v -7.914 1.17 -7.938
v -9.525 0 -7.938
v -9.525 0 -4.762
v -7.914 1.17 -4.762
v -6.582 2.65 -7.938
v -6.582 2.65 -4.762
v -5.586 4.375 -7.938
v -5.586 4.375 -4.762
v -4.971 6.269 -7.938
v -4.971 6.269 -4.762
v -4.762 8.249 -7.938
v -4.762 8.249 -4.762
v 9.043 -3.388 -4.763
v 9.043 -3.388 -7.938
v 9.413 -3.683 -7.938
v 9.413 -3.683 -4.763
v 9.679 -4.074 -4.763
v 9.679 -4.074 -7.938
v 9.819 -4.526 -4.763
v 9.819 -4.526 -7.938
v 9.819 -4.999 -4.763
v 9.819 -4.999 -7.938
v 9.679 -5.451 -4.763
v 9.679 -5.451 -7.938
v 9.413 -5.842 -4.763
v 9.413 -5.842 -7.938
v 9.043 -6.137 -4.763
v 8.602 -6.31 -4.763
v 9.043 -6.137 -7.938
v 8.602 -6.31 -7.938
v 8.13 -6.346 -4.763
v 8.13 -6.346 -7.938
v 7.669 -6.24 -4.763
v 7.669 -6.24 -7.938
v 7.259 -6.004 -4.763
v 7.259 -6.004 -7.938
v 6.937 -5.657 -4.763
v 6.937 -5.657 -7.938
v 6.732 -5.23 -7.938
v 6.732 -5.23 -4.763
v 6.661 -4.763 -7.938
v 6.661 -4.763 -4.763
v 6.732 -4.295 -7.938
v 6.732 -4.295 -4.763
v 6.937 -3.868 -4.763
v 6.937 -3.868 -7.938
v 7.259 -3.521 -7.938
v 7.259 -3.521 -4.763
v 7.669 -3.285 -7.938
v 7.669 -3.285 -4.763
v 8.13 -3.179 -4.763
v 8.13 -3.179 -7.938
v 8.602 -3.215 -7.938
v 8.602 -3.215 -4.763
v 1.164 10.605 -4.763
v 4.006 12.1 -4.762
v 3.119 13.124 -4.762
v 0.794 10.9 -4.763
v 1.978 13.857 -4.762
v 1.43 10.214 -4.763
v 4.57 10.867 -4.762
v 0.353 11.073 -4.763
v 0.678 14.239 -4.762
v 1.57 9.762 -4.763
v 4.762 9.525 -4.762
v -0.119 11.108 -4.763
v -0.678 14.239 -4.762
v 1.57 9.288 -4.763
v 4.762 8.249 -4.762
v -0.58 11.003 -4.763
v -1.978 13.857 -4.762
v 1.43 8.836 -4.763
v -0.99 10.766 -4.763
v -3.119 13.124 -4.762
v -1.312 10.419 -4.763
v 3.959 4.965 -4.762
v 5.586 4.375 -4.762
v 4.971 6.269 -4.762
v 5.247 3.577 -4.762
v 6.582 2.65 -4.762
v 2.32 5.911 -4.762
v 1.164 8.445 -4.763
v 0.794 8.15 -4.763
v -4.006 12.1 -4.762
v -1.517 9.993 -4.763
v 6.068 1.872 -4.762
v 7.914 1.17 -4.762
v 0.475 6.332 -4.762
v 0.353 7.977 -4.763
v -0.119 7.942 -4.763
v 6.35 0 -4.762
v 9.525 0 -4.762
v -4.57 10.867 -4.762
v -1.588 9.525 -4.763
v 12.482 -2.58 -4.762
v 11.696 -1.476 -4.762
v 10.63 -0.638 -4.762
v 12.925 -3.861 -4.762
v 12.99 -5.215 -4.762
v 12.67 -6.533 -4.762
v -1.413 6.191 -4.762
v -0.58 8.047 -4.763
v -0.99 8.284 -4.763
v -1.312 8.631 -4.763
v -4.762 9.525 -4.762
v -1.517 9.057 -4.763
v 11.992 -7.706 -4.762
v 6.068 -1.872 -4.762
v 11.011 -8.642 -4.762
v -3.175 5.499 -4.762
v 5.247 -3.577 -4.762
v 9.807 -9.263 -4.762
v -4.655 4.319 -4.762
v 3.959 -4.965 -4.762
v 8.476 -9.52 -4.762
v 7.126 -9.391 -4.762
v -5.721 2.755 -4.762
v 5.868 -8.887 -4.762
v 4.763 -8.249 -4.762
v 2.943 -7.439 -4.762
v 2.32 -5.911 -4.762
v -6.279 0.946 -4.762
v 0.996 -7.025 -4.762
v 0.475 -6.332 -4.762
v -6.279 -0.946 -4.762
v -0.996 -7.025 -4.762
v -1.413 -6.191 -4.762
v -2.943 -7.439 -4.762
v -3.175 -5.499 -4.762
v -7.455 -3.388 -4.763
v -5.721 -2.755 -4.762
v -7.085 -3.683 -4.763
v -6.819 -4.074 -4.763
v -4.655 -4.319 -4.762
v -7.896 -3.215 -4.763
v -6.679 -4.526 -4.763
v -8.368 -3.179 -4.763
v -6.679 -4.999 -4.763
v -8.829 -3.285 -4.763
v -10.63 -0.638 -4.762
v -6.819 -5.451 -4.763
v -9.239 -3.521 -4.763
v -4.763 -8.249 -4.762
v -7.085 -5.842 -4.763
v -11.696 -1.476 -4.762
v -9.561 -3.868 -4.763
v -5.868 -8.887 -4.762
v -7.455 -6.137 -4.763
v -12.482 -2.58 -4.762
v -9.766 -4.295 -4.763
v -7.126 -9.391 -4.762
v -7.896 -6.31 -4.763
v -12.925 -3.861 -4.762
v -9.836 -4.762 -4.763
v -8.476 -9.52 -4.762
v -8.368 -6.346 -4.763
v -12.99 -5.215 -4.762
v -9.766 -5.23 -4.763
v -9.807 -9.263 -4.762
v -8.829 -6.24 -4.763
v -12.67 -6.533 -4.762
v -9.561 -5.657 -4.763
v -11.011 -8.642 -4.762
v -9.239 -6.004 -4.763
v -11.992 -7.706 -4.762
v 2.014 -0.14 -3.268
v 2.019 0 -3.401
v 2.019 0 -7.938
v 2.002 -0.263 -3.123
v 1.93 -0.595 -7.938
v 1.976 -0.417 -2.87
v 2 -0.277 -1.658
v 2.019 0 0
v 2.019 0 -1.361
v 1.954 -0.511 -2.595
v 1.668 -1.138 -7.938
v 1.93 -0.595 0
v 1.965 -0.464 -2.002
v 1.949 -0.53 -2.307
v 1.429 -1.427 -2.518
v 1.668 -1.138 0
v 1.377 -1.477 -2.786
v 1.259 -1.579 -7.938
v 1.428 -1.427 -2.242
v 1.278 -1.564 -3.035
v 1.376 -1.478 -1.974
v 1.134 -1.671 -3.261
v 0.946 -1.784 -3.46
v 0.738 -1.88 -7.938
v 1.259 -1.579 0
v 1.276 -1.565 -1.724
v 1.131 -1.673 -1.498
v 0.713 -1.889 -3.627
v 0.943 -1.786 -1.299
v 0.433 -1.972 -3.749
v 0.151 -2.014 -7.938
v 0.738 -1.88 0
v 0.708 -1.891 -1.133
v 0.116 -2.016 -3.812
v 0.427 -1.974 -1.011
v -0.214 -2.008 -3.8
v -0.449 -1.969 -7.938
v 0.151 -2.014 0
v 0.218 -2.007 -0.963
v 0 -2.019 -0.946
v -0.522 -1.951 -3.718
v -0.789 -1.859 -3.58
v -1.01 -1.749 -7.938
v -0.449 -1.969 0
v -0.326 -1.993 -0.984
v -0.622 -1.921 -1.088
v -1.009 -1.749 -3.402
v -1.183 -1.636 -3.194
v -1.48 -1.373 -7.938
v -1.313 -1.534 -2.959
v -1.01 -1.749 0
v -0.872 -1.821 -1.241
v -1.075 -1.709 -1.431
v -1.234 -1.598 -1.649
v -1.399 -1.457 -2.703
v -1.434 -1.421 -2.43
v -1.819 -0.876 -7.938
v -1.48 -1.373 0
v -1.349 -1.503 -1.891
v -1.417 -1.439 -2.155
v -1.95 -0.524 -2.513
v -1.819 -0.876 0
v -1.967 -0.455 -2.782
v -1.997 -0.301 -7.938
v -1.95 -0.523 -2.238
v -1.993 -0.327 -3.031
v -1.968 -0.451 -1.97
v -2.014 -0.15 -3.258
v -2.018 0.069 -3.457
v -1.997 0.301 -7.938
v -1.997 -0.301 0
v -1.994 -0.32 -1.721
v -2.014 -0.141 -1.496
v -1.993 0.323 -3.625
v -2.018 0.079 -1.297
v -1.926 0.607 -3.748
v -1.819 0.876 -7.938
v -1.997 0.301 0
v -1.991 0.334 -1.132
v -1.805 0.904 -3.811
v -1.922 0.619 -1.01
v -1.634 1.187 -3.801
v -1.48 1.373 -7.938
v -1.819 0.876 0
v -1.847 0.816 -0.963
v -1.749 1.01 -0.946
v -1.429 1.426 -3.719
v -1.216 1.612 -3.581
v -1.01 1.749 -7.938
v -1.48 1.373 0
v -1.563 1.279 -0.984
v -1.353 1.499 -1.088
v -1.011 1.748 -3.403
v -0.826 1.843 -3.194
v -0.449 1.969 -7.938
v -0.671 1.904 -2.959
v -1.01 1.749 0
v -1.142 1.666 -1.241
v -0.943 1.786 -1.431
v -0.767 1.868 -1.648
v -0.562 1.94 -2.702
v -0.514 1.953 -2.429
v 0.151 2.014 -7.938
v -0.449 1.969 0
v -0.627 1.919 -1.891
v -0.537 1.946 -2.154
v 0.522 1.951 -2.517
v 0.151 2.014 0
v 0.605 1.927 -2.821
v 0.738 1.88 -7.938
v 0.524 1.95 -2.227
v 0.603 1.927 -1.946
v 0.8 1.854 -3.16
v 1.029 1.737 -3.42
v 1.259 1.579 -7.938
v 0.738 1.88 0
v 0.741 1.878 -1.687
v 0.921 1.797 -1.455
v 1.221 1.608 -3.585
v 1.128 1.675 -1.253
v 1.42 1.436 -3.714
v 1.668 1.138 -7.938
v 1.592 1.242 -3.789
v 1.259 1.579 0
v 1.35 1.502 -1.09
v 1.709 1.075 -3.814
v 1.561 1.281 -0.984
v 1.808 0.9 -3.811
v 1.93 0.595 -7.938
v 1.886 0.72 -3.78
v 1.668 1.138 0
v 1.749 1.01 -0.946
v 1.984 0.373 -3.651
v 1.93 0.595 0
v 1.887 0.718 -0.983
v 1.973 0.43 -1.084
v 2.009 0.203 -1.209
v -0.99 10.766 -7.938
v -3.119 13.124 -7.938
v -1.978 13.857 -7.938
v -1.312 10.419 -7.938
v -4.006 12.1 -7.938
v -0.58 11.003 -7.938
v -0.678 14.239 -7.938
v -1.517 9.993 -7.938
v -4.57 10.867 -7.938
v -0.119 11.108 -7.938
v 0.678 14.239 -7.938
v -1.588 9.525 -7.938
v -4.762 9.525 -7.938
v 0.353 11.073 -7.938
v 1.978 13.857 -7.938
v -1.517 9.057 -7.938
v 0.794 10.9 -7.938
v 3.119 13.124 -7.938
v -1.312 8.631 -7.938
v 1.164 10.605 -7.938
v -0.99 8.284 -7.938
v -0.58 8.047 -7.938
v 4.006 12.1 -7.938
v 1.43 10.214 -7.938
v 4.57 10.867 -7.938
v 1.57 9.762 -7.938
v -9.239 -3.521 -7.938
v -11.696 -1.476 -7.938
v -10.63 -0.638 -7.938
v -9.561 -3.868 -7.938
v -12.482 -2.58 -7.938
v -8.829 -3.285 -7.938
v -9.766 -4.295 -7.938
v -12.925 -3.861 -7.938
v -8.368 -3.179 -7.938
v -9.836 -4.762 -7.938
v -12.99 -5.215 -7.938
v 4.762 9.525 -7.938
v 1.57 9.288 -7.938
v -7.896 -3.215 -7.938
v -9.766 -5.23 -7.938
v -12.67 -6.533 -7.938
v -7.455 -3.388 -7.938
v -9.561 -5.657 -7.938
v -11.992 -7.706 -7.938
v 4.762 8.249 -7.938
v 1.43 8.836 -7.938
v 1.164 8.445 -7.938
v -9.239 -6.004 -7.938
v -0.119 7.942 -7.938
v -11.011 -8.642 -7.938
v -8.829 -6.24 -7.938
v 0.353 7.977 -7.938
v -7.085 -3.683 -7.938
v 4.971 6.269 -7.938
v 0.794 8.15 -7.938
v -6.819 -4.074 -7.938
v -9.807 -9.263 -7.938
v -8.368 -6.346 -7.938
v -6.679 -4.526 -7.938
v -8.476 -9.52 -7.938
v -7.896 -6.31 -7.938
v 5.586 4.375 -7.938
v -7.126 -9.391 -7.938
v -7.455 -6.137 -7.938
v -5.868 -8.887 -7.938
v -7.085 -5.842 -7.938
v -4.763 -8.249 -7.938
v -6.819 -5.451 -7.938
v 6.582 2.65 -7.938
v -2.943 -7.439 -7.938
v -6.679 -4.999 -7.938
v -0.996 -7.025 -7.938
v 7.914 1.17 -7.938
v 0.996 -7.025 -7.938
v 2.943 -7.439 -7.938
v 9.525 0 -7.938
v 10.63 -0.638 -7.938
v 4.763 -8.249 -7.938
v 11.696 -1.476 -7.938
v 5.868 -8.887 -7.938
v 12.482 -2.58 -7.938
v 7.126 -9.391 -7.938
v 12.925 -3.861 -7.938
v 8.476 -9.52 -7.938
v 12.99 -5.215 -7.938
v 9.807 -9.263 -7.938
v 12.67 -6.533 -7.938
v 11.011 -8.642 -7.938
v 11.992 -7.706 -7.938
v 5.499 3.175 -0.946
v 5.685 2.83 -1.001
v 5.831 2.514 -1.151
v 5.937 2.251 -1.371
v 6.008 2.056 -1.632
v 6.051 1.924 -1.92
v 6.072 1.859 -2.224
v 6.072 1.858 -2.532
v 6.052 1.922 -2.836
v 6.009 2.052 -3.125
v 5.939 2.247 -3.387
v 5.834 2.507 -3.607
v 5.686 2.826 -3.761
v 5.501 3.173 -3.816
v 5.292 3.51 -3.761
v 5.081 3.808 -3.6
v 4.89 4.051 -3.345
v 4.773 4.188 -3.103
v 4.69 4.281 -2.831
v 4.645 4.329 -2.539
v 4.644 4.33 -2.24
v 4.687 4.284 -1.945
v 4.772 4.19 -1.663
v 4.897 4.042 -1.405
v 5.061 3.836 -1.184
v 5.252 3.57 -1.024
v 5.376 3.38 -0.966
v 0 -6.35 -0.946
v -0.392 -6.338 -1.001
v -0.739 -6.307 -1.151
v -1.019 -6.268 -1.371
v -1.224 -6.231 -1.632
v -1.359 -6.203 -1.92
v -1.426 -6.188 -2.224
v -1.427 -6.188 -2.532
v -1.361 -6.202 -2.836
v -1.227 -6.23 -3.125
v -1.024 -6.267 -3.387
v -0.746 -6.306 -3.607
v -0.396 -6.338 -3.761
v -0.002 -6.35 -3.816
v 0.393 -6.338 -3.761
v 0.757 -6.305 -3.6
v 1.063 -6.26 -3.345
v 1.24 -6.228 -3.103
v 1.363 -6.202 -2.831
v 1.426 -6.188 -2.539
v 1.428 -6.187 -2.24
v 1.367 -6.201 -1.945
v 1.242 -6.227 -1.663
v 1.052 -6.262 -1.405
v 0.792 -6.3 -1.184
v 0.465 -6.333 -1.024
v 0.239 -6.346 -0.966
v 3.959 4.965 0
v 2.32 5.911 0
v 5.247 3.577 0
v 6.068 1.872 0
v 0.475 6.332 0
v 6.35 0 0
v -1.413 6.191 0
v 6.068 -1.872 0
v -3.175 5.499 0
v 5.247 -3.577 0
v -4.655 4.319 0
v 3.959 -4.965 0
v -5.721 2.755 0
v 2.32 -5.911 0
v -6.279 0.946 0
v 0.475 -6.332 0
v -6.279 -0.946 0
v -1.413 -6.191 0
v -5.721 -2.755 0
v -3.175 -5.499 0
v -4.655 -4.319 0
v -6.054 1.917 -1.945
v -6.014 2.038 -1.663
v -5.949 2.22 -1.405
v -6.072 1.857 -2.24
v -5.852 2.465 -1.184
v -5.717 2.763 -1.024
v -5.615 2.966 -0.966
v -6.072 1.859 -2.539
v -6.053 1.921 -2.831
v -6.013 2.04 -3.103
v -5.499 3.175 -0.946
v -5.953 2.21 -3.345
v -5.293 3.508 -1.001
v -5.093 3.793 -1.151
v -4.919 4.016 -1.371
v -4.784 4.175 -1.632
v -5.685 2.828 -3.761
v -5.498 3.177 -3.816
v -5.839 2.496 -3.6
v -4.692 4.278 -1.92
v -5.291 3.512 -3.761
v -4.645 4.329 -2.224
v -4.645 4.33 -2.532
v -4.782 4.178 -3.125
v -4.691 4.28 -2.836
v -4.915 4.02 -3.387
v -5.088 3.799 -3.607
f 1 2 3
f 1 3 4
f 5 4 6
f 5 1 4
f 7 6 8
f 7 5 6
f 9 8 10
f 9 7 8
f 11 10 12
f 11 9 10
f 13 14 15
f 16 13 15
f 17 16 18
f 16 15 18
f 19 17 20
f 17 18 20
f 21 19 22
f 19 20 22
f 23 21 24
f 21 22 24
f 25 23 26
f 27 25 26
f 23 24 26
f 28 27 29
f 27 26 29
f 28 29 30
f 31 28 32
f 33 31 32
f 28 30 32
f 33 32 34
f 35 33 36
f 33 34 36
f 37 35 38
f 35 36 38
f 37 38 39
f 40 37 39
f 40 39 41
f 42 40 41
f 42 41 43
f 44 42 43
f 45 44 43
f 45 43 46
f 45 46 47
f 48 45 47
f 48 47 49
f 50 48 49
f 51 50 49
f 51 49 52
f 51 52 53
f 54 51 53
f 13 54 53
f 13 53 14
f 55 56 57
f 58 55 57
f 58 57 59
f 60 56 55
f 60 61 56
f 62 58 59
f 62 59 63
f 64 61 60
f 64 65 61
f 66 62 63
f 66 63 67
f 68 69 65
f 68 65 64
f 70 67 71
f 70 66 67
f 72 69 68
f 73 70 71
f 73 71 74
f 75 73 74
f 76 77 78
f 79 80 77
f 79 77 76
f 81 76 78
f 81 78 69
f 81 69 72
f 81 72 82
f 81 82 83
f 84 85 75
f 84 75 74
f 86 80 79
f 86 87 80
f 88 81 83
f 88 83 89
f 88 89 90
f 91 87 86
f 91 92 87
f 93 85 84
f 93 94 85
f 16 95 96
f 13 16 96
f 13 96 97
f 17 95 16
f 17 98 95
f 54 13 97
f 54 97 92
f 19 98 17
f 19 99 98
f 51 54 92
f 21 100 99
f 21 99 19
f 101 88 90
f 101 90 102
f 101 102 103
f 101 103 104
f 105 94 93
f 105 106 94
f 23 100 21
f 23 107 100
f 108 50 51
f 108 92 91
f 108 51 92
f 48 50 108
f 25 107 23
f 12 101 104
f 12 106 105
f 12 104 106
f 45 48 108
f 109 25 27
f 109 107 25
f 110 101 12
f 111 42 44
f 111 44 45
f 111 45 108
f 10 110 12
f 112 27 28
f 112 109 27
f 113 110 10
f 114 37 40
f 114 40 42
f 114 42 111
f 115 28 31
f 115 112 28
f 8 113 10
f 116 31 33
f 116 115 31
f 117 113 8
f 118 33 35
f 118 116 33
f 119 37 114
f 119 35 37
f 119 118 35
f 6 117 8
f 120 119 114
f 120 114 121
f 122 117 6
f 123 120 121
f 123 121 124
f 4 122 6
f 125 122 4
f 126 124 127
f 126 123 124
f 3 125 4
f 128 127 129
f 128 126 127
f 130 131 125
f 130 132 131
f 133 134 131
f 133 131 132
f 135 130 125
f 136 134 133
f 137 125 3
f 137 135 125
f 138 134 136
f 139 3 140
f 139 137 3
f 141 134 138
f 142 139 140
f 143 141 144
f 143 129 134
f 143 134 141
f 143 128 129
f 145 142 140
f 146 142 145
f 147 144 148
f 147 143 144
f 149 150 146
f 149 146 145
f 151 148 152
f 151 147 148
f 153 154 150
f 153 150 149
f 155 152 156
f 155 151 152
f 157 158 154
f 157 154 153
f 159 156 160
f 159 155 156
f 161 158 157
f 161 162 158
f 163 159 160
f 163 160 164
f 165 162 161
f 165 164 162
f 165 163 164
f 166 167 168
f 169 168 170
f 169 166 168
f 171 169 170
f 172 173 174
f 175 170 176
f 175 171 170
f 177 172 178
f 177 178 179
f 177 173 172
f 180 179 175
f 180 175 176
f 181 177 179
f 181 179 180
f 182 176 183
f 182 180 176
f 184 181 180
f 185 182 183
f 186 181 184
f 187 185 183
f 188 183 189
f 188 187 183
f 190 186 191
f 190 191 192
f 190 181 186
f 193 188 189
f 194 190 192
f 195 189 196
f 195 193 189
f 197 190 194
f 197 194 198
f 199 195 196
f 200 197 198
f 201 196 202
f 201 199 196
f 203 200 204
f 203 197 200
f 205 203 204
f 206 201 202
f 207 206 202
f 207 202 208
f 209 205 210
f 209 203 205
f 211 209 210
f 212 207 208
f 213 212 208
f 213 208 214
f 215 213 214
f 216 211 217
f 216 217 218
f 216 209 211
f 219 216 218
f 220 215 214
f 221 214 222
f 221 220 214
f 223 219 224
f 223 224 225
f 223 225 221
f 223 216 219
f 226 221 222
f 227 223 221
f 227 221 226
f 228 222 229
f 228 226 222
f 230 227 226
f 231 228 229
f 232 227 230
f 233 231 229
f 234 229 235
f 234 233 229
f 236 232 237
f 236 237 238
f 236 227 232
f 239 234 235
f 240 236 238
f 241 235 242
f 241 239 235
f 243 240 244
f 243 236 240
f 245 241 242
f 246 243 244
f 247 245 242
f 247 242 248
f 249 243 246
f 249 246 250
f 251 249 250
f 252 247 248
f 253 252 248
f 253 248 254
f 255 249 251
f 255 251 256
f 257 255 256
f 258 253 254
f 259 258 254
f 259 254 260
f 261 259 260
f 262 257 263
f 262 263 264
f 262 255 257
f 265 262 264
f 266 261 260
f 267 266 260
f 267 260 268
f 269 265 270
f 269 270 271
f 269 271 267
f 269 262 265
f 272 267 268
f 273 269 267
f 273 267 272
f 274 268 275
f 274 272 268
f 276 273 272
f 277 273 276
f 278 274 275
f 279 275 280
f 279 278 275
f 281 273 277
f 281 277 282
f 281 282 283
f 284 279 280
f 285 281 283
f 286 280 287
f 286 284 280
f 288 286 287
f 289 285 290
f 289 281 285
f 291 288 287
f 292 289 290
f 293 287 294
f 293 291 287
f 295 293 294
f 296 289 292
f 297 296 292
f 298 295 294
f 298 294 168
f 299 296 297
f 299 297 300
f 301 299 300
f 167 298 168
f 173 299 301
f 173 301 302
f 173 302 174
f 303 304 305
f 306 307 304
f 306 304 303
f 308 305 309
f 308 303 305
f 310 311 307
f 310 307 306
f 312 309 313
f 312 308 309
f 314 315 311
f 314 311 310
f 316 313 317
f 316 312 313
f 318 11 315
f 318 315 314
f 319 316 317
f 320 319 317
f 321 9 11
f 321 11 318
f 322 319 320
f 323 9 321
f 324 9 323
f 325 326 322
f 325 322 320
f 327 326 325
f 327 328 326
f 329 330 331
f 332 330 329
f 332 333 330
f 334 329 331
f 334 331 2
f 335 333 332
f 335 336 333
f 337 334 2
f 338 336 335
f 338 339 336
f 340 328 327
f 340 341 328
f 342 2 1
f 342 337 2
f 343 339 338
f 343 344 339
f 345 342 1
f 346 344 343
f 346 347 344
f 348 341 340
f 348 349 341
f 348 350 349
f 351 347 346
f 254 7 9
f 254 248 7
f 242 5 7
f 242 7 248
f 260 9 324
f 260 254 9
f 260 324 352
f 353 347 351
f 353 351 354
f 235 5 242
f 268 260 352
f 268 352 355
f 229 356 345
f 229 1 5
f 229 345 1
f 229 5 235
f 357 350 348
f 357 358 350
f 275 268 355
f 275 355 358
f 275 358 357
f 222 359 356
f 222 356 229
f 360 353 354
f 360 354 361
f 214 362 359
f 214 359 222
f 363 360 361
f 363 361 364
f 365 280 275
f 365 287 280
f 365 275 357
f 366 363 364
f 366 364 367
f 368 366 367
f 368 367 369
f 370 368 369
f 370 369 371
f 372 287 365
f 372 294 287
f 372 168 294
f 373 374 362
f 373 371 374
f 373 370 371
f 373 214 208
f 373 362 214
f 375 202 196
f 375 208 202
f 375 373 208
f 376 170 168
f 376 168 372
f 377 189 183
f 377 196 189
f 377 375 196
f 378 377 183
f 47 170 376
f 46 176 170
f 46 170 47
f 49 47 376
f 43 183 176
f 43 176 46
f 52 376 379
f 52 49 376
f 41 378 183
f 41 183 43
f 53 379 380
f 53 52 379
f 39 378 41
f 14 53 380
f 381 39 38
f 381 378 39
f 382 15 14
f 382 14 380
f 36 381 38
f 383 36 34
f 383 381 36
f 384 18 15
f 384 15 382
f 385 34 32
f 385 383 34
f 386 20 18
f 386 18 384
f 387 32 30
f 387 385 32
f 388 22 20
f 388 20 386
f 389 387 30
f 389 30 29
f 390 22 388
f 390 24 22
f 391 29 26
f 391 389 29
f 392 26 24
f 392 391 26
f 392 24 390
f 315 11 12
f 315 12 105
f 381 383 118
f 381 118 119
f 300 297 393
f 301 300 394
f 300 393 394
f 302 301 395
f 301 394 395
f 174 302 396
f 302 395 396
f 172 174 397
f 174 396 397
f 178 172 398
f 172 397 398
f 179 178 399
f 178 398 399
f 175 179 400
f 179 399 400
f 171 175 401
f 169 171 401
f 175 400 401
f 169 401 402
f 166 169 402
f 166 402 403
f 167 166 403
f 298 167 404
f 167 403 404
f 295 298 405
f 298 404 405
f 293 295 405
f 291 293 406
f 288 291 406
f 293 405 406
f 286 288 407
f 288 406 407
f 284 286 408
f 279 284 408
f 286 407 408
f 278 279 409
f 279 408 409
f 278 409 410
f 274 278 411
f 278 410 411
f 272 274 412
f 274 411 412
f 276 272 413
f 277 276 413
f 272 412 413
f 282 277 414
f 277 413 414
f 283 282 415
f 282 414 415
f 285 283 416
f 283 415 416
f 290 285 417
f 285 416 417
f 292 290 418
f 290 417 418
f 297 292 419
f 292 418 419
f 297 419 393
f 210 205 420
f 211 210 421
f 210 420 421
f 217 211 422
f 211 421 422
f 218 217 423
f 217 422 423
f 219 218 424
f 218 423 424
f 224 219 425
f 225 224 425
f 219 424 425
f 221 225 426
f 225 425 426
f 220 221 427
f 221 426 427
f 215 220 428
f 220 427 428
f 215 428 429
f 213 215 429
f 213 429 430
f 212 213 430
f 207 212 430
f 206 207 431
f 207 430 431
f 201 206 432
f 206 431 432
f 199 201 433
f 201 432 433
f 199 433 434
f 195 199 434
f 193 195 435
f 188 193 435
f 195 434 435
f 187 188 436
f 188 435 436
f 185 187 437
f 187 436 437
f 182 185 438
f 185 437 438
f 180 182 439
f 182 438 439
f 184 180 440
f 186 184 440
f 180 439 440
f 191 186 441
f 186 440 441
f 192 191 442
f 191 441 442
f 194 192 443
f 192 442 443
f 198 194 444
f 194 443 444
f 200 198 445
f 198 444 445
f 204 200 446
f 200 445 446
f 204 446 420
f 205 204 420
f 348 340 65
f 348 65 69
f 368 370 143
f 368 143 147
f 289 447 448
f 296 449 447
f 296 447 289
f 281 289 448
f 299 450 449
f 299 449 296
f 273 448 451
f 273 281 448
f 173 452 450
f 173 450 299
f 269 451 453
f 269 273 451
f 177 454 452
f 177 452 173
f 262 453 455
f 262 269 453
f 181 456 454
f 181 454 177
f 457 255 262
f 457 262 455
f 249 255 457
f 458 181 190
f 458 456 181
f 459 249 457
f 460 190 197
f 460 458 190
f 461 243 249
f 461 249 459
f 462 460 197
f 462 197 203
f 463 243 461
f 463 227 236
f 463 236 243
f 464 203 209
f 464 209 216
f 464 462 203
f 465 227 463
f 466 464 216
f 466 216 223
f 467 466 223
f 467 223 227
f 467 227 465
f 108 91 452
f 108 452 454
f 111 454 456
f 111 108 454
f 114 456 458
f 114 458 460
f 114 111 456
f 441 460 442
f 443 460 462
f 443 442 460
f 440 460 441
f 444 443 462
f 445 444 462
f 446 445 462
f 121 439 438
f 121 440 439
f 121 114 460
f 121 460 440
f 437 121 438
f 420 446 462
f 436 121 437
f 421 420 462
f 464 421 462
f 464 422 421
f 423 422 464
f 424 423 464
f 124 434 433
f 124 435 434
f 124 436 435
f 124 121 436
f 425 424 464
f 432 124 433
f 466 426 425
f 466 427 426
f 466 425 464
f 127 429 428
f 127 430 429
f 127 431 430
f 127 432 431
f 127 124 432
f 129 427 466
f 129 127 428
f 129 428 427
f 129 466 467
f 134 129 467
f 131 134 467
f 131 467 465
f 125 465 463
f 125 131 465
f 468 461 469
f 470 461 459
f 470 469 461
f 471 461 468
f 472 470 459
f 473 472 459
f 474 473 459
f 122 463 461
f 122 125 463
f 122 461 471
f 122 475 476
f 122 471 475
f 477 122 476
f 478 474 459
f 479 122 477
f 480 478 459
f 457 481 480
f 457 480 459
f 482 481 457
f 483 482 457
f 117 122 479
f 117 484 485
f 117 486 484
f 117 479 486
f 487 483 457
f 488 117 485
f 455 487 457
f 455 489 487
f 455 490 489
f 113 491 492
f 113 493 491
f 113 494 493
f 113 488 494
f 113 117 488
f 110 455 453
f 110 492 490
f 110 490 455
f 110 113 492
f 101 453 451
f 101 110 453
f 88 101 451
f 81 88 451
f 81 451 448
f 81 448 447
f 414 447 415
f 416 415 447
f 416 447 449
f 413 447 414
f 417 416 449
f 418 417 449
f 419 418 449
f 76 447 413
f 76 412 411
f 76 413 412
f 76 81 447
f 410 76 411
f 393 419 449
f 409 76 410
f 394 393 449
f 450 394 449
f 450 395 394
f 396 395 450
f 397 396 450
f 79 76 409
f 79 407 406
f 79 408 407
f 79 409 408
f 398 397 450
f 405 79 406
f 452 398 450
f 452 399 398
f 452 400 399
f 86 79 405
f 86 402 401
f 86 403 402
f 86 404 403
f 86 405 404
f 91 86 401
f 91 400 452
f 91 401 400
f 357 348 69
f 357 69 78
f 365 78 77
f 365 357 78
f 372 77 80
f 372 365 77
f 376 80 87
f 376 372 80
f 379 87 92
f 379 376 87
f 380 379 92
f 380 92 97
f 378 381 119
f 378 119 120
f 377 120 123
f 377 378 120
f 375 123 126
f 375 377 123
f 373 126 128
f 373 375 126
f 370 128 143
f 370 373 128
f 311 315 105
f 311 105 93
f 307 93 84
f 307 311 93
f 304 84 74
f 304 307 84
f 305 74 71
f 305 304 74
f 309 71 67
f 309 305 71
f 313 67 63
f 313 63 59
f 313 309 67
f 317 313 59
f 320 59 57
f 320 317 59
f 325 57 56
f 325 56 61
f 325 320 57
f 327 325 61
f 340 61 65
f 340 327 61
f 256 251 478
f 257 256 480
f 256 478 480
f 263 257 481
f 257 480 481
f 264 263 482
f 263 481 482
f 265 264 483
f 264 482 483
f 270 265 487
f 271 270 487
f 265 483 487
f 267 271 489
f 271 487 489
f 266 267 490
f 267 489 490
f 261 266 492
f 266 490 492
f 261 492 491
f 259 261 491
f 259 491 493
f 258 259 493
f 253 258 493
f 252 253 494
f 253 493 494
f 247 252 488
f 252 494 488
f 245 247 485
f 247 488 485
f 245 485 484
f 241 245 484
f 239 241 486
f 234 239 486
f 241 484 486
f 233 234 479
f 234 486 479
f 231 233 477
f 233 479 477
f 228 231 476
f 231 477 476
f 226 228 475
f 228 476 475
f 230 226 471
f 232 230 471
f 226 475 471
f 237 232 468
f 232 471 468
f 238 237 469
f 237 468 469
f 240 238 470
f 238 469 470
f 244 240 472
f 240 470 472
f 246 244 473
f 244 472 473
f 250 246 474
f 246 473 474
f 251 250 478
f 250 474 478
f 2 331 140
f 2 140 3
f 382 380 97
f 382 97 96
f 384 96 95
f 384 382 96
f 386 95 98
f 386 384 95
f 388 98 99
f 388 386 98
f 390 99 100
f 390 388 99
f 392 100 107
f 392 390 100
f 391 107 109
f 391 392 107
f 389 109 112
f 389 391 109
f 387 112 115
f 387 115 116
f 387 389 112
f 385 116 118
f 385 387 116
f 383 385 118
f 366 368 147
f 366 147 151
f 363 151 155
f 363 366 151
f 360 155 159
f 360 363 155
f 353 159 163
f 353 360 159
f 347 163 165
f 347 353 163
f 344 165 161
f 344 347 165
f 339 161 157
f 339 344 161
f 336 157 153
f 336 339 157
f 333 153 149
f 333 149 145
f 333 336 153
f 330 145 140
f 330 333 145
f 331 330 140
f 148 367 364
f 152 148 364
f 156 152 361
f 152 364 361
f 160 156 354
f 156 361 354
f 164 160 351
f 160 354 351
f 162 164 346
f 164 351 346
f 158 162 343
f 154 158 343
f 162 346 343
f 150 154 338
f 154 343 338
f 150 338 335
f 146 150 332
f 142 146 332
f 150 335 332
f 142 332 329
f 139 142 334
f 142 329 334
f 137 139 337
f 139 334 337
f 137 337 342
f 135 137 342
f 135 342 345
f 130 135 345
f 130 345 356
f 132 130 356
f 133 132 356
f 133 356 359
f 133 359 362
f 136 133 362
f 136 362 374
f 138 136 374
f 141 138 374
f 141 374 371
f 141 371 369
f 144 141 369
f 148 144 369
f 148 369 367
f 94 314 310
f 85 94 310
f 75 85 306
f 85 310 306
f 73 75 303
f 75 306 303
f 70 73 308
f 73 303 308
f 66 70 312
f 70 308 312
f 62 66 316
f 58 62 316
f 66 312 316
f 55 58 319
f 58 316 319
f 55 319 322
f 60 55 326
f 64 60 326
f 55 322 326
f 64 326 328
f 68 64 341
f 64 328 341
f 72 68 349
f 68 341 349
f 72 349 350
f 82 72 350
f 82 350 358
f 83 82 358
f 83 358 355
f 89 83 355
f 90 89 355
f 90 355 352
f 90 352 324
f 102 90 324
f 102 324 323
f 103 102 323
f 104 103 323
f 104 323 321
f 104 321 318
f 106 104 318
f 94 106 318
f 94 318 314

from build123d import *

# Parameters (mm, degrees)
F_1_8_0_1250_DOWEL_HOLE1_D = 3.175
SKETCH6_W                  = 1.4351
SKETCH6_H                  = 21.685653285
CIRPATTERN1_COUNT          = 3
CIRPATTERN2_COUNT          = 3
CUT_EXTRUDE1_START         = -10
SKETCH7_R                  = 15.875
CUT_EXTRUDE1_DEPTH         = 10


with BuildPart() as part:
    # Sketch1 → Revolve1 (revolve)
    with BuildSketch(Plane(origin=(0, 0, 0), x_dir=(0, 0, -1), z_dir=(1, 0, 0)), mode=Mode.PRIVATE) as revolve1_sk:
        Polygon((0, 2.0193), (0, 6.35), (4.7625, 6.35), (4.7625, 15.875), (7.9375, 15.875), (7.9375, 2.0193), align=None)
    revolve(revolve1_sk.sketch.rotate(Axis((0, 0, 0), (0, 0, -1)), 90), axis=Axis((0, 0, 0), (0, 0, -1)))

    # 1/8 (0.1250) Dowel Hole1 (through all)
    with Locations(Plane.XY.offset(-4.7625)):
        with Locations((0, 9.525), (0, 0)):
            f_1_8_0_1250_dowel_hole1 = Hole(F_1_8_0_1250_DOWEL_HOLE1_D / 2)

    # Sketch6 → #6-40 Tapped Hole1 (revolve, cut)
    with BuildSketch(Plane(origin=(0, 0, -2.38125), x_dir=(0, 0, 1), z_dir=(1, 0, 0))):
        with Locations((0.71755, 10.842826643)):
            Rectangle(SKETCH6_W, SKETCH6_H)
    f_6_40_tapped_hole1 = revolve(axis=Axis((0, 6.35, -2.38125), (0, -1, 0)), mode=Mode.SUBTRACT)

    # CirPattern1: #6-40 Tapped Hole1 ×3 about axis
    cirpattern1_axis = Axis((0, 0, 0), (0, 0, 1))
    for i in range(1, CIRPATTERN1_COUNT):
        add(f_6_40_tapped_hole1.rotate(cirpattern1_axis, i * 360 / CIRPATTERN1_COUNT), mode=Mode.SUBTRACT)

    # CirPattern2: 1/8 (0.1250) Dowel Hole1 ×3 about axis
    cirpattern2_axis = Axis((0, 0, 0), (0, 0, 1))
    for i in range(1, CIRPATTERN2_COUNT):
        add(f_1_8_0_1250_dowel_hole1.rotate(cirpattern2_axis, i * 360 / CIRPATTERN2_COUNT), mode=Mode.SUBTRACT)

    # Sketch7 → Cut-Extrude1 (cut)
    with BuildSketch(Plane.XY.offset(-4.7625).offset(CUT_EXTRUDE1_START)):
        Circle(SKETCH7_R)
        with BuildLine():
            ThreePointArc((-4.7625, 9.525), (0, 14.2875), (4.7625, 9.525))
            Line((4.7625, 9.525), (4.7625, 8.248891971))
            ThreePointArc((4.7625, 8.248891971), (6.038608029, 3.486391971), (9.525, 0))
            Line((9.525, 0), (10.630141971, -0.638054014))
            ThreePointArc((10.630141971, -0.638054014), (12.373337957, -7.14375), (5.867641971, -8.886945986))
            Line((5.867641971, -8.886945986), (4.7625, -8.248891971))
            ThreePointArc((4.7625, -8.248891971), (0, -6.972783942), (-4.7625, -8.248891971))
            Line((-4.7625, -8.248891971), (-5.867641971, -8.886945986))
            ThreePointArc((-5.867641971, -8.886945986), (-12.373337957, -7.14375), (-10.630141971, -0.638054014))
            Line((-10.630141971, -0.638054014), (-9.525, 0))
            ThreePointArc((-9.525, 0), (-6.038608029, 3.486391971), (-4.7625, 8.248891971))
            Line((-4.7625, 8.248891971), (-4.7625, 9.525))
        make_face(mode=Mode.SUBTRACT)
    extrude(amount=CUT_EXTRUDE1_DEPTH, mode=Mode.SUBTRACT)


solid = part.part
